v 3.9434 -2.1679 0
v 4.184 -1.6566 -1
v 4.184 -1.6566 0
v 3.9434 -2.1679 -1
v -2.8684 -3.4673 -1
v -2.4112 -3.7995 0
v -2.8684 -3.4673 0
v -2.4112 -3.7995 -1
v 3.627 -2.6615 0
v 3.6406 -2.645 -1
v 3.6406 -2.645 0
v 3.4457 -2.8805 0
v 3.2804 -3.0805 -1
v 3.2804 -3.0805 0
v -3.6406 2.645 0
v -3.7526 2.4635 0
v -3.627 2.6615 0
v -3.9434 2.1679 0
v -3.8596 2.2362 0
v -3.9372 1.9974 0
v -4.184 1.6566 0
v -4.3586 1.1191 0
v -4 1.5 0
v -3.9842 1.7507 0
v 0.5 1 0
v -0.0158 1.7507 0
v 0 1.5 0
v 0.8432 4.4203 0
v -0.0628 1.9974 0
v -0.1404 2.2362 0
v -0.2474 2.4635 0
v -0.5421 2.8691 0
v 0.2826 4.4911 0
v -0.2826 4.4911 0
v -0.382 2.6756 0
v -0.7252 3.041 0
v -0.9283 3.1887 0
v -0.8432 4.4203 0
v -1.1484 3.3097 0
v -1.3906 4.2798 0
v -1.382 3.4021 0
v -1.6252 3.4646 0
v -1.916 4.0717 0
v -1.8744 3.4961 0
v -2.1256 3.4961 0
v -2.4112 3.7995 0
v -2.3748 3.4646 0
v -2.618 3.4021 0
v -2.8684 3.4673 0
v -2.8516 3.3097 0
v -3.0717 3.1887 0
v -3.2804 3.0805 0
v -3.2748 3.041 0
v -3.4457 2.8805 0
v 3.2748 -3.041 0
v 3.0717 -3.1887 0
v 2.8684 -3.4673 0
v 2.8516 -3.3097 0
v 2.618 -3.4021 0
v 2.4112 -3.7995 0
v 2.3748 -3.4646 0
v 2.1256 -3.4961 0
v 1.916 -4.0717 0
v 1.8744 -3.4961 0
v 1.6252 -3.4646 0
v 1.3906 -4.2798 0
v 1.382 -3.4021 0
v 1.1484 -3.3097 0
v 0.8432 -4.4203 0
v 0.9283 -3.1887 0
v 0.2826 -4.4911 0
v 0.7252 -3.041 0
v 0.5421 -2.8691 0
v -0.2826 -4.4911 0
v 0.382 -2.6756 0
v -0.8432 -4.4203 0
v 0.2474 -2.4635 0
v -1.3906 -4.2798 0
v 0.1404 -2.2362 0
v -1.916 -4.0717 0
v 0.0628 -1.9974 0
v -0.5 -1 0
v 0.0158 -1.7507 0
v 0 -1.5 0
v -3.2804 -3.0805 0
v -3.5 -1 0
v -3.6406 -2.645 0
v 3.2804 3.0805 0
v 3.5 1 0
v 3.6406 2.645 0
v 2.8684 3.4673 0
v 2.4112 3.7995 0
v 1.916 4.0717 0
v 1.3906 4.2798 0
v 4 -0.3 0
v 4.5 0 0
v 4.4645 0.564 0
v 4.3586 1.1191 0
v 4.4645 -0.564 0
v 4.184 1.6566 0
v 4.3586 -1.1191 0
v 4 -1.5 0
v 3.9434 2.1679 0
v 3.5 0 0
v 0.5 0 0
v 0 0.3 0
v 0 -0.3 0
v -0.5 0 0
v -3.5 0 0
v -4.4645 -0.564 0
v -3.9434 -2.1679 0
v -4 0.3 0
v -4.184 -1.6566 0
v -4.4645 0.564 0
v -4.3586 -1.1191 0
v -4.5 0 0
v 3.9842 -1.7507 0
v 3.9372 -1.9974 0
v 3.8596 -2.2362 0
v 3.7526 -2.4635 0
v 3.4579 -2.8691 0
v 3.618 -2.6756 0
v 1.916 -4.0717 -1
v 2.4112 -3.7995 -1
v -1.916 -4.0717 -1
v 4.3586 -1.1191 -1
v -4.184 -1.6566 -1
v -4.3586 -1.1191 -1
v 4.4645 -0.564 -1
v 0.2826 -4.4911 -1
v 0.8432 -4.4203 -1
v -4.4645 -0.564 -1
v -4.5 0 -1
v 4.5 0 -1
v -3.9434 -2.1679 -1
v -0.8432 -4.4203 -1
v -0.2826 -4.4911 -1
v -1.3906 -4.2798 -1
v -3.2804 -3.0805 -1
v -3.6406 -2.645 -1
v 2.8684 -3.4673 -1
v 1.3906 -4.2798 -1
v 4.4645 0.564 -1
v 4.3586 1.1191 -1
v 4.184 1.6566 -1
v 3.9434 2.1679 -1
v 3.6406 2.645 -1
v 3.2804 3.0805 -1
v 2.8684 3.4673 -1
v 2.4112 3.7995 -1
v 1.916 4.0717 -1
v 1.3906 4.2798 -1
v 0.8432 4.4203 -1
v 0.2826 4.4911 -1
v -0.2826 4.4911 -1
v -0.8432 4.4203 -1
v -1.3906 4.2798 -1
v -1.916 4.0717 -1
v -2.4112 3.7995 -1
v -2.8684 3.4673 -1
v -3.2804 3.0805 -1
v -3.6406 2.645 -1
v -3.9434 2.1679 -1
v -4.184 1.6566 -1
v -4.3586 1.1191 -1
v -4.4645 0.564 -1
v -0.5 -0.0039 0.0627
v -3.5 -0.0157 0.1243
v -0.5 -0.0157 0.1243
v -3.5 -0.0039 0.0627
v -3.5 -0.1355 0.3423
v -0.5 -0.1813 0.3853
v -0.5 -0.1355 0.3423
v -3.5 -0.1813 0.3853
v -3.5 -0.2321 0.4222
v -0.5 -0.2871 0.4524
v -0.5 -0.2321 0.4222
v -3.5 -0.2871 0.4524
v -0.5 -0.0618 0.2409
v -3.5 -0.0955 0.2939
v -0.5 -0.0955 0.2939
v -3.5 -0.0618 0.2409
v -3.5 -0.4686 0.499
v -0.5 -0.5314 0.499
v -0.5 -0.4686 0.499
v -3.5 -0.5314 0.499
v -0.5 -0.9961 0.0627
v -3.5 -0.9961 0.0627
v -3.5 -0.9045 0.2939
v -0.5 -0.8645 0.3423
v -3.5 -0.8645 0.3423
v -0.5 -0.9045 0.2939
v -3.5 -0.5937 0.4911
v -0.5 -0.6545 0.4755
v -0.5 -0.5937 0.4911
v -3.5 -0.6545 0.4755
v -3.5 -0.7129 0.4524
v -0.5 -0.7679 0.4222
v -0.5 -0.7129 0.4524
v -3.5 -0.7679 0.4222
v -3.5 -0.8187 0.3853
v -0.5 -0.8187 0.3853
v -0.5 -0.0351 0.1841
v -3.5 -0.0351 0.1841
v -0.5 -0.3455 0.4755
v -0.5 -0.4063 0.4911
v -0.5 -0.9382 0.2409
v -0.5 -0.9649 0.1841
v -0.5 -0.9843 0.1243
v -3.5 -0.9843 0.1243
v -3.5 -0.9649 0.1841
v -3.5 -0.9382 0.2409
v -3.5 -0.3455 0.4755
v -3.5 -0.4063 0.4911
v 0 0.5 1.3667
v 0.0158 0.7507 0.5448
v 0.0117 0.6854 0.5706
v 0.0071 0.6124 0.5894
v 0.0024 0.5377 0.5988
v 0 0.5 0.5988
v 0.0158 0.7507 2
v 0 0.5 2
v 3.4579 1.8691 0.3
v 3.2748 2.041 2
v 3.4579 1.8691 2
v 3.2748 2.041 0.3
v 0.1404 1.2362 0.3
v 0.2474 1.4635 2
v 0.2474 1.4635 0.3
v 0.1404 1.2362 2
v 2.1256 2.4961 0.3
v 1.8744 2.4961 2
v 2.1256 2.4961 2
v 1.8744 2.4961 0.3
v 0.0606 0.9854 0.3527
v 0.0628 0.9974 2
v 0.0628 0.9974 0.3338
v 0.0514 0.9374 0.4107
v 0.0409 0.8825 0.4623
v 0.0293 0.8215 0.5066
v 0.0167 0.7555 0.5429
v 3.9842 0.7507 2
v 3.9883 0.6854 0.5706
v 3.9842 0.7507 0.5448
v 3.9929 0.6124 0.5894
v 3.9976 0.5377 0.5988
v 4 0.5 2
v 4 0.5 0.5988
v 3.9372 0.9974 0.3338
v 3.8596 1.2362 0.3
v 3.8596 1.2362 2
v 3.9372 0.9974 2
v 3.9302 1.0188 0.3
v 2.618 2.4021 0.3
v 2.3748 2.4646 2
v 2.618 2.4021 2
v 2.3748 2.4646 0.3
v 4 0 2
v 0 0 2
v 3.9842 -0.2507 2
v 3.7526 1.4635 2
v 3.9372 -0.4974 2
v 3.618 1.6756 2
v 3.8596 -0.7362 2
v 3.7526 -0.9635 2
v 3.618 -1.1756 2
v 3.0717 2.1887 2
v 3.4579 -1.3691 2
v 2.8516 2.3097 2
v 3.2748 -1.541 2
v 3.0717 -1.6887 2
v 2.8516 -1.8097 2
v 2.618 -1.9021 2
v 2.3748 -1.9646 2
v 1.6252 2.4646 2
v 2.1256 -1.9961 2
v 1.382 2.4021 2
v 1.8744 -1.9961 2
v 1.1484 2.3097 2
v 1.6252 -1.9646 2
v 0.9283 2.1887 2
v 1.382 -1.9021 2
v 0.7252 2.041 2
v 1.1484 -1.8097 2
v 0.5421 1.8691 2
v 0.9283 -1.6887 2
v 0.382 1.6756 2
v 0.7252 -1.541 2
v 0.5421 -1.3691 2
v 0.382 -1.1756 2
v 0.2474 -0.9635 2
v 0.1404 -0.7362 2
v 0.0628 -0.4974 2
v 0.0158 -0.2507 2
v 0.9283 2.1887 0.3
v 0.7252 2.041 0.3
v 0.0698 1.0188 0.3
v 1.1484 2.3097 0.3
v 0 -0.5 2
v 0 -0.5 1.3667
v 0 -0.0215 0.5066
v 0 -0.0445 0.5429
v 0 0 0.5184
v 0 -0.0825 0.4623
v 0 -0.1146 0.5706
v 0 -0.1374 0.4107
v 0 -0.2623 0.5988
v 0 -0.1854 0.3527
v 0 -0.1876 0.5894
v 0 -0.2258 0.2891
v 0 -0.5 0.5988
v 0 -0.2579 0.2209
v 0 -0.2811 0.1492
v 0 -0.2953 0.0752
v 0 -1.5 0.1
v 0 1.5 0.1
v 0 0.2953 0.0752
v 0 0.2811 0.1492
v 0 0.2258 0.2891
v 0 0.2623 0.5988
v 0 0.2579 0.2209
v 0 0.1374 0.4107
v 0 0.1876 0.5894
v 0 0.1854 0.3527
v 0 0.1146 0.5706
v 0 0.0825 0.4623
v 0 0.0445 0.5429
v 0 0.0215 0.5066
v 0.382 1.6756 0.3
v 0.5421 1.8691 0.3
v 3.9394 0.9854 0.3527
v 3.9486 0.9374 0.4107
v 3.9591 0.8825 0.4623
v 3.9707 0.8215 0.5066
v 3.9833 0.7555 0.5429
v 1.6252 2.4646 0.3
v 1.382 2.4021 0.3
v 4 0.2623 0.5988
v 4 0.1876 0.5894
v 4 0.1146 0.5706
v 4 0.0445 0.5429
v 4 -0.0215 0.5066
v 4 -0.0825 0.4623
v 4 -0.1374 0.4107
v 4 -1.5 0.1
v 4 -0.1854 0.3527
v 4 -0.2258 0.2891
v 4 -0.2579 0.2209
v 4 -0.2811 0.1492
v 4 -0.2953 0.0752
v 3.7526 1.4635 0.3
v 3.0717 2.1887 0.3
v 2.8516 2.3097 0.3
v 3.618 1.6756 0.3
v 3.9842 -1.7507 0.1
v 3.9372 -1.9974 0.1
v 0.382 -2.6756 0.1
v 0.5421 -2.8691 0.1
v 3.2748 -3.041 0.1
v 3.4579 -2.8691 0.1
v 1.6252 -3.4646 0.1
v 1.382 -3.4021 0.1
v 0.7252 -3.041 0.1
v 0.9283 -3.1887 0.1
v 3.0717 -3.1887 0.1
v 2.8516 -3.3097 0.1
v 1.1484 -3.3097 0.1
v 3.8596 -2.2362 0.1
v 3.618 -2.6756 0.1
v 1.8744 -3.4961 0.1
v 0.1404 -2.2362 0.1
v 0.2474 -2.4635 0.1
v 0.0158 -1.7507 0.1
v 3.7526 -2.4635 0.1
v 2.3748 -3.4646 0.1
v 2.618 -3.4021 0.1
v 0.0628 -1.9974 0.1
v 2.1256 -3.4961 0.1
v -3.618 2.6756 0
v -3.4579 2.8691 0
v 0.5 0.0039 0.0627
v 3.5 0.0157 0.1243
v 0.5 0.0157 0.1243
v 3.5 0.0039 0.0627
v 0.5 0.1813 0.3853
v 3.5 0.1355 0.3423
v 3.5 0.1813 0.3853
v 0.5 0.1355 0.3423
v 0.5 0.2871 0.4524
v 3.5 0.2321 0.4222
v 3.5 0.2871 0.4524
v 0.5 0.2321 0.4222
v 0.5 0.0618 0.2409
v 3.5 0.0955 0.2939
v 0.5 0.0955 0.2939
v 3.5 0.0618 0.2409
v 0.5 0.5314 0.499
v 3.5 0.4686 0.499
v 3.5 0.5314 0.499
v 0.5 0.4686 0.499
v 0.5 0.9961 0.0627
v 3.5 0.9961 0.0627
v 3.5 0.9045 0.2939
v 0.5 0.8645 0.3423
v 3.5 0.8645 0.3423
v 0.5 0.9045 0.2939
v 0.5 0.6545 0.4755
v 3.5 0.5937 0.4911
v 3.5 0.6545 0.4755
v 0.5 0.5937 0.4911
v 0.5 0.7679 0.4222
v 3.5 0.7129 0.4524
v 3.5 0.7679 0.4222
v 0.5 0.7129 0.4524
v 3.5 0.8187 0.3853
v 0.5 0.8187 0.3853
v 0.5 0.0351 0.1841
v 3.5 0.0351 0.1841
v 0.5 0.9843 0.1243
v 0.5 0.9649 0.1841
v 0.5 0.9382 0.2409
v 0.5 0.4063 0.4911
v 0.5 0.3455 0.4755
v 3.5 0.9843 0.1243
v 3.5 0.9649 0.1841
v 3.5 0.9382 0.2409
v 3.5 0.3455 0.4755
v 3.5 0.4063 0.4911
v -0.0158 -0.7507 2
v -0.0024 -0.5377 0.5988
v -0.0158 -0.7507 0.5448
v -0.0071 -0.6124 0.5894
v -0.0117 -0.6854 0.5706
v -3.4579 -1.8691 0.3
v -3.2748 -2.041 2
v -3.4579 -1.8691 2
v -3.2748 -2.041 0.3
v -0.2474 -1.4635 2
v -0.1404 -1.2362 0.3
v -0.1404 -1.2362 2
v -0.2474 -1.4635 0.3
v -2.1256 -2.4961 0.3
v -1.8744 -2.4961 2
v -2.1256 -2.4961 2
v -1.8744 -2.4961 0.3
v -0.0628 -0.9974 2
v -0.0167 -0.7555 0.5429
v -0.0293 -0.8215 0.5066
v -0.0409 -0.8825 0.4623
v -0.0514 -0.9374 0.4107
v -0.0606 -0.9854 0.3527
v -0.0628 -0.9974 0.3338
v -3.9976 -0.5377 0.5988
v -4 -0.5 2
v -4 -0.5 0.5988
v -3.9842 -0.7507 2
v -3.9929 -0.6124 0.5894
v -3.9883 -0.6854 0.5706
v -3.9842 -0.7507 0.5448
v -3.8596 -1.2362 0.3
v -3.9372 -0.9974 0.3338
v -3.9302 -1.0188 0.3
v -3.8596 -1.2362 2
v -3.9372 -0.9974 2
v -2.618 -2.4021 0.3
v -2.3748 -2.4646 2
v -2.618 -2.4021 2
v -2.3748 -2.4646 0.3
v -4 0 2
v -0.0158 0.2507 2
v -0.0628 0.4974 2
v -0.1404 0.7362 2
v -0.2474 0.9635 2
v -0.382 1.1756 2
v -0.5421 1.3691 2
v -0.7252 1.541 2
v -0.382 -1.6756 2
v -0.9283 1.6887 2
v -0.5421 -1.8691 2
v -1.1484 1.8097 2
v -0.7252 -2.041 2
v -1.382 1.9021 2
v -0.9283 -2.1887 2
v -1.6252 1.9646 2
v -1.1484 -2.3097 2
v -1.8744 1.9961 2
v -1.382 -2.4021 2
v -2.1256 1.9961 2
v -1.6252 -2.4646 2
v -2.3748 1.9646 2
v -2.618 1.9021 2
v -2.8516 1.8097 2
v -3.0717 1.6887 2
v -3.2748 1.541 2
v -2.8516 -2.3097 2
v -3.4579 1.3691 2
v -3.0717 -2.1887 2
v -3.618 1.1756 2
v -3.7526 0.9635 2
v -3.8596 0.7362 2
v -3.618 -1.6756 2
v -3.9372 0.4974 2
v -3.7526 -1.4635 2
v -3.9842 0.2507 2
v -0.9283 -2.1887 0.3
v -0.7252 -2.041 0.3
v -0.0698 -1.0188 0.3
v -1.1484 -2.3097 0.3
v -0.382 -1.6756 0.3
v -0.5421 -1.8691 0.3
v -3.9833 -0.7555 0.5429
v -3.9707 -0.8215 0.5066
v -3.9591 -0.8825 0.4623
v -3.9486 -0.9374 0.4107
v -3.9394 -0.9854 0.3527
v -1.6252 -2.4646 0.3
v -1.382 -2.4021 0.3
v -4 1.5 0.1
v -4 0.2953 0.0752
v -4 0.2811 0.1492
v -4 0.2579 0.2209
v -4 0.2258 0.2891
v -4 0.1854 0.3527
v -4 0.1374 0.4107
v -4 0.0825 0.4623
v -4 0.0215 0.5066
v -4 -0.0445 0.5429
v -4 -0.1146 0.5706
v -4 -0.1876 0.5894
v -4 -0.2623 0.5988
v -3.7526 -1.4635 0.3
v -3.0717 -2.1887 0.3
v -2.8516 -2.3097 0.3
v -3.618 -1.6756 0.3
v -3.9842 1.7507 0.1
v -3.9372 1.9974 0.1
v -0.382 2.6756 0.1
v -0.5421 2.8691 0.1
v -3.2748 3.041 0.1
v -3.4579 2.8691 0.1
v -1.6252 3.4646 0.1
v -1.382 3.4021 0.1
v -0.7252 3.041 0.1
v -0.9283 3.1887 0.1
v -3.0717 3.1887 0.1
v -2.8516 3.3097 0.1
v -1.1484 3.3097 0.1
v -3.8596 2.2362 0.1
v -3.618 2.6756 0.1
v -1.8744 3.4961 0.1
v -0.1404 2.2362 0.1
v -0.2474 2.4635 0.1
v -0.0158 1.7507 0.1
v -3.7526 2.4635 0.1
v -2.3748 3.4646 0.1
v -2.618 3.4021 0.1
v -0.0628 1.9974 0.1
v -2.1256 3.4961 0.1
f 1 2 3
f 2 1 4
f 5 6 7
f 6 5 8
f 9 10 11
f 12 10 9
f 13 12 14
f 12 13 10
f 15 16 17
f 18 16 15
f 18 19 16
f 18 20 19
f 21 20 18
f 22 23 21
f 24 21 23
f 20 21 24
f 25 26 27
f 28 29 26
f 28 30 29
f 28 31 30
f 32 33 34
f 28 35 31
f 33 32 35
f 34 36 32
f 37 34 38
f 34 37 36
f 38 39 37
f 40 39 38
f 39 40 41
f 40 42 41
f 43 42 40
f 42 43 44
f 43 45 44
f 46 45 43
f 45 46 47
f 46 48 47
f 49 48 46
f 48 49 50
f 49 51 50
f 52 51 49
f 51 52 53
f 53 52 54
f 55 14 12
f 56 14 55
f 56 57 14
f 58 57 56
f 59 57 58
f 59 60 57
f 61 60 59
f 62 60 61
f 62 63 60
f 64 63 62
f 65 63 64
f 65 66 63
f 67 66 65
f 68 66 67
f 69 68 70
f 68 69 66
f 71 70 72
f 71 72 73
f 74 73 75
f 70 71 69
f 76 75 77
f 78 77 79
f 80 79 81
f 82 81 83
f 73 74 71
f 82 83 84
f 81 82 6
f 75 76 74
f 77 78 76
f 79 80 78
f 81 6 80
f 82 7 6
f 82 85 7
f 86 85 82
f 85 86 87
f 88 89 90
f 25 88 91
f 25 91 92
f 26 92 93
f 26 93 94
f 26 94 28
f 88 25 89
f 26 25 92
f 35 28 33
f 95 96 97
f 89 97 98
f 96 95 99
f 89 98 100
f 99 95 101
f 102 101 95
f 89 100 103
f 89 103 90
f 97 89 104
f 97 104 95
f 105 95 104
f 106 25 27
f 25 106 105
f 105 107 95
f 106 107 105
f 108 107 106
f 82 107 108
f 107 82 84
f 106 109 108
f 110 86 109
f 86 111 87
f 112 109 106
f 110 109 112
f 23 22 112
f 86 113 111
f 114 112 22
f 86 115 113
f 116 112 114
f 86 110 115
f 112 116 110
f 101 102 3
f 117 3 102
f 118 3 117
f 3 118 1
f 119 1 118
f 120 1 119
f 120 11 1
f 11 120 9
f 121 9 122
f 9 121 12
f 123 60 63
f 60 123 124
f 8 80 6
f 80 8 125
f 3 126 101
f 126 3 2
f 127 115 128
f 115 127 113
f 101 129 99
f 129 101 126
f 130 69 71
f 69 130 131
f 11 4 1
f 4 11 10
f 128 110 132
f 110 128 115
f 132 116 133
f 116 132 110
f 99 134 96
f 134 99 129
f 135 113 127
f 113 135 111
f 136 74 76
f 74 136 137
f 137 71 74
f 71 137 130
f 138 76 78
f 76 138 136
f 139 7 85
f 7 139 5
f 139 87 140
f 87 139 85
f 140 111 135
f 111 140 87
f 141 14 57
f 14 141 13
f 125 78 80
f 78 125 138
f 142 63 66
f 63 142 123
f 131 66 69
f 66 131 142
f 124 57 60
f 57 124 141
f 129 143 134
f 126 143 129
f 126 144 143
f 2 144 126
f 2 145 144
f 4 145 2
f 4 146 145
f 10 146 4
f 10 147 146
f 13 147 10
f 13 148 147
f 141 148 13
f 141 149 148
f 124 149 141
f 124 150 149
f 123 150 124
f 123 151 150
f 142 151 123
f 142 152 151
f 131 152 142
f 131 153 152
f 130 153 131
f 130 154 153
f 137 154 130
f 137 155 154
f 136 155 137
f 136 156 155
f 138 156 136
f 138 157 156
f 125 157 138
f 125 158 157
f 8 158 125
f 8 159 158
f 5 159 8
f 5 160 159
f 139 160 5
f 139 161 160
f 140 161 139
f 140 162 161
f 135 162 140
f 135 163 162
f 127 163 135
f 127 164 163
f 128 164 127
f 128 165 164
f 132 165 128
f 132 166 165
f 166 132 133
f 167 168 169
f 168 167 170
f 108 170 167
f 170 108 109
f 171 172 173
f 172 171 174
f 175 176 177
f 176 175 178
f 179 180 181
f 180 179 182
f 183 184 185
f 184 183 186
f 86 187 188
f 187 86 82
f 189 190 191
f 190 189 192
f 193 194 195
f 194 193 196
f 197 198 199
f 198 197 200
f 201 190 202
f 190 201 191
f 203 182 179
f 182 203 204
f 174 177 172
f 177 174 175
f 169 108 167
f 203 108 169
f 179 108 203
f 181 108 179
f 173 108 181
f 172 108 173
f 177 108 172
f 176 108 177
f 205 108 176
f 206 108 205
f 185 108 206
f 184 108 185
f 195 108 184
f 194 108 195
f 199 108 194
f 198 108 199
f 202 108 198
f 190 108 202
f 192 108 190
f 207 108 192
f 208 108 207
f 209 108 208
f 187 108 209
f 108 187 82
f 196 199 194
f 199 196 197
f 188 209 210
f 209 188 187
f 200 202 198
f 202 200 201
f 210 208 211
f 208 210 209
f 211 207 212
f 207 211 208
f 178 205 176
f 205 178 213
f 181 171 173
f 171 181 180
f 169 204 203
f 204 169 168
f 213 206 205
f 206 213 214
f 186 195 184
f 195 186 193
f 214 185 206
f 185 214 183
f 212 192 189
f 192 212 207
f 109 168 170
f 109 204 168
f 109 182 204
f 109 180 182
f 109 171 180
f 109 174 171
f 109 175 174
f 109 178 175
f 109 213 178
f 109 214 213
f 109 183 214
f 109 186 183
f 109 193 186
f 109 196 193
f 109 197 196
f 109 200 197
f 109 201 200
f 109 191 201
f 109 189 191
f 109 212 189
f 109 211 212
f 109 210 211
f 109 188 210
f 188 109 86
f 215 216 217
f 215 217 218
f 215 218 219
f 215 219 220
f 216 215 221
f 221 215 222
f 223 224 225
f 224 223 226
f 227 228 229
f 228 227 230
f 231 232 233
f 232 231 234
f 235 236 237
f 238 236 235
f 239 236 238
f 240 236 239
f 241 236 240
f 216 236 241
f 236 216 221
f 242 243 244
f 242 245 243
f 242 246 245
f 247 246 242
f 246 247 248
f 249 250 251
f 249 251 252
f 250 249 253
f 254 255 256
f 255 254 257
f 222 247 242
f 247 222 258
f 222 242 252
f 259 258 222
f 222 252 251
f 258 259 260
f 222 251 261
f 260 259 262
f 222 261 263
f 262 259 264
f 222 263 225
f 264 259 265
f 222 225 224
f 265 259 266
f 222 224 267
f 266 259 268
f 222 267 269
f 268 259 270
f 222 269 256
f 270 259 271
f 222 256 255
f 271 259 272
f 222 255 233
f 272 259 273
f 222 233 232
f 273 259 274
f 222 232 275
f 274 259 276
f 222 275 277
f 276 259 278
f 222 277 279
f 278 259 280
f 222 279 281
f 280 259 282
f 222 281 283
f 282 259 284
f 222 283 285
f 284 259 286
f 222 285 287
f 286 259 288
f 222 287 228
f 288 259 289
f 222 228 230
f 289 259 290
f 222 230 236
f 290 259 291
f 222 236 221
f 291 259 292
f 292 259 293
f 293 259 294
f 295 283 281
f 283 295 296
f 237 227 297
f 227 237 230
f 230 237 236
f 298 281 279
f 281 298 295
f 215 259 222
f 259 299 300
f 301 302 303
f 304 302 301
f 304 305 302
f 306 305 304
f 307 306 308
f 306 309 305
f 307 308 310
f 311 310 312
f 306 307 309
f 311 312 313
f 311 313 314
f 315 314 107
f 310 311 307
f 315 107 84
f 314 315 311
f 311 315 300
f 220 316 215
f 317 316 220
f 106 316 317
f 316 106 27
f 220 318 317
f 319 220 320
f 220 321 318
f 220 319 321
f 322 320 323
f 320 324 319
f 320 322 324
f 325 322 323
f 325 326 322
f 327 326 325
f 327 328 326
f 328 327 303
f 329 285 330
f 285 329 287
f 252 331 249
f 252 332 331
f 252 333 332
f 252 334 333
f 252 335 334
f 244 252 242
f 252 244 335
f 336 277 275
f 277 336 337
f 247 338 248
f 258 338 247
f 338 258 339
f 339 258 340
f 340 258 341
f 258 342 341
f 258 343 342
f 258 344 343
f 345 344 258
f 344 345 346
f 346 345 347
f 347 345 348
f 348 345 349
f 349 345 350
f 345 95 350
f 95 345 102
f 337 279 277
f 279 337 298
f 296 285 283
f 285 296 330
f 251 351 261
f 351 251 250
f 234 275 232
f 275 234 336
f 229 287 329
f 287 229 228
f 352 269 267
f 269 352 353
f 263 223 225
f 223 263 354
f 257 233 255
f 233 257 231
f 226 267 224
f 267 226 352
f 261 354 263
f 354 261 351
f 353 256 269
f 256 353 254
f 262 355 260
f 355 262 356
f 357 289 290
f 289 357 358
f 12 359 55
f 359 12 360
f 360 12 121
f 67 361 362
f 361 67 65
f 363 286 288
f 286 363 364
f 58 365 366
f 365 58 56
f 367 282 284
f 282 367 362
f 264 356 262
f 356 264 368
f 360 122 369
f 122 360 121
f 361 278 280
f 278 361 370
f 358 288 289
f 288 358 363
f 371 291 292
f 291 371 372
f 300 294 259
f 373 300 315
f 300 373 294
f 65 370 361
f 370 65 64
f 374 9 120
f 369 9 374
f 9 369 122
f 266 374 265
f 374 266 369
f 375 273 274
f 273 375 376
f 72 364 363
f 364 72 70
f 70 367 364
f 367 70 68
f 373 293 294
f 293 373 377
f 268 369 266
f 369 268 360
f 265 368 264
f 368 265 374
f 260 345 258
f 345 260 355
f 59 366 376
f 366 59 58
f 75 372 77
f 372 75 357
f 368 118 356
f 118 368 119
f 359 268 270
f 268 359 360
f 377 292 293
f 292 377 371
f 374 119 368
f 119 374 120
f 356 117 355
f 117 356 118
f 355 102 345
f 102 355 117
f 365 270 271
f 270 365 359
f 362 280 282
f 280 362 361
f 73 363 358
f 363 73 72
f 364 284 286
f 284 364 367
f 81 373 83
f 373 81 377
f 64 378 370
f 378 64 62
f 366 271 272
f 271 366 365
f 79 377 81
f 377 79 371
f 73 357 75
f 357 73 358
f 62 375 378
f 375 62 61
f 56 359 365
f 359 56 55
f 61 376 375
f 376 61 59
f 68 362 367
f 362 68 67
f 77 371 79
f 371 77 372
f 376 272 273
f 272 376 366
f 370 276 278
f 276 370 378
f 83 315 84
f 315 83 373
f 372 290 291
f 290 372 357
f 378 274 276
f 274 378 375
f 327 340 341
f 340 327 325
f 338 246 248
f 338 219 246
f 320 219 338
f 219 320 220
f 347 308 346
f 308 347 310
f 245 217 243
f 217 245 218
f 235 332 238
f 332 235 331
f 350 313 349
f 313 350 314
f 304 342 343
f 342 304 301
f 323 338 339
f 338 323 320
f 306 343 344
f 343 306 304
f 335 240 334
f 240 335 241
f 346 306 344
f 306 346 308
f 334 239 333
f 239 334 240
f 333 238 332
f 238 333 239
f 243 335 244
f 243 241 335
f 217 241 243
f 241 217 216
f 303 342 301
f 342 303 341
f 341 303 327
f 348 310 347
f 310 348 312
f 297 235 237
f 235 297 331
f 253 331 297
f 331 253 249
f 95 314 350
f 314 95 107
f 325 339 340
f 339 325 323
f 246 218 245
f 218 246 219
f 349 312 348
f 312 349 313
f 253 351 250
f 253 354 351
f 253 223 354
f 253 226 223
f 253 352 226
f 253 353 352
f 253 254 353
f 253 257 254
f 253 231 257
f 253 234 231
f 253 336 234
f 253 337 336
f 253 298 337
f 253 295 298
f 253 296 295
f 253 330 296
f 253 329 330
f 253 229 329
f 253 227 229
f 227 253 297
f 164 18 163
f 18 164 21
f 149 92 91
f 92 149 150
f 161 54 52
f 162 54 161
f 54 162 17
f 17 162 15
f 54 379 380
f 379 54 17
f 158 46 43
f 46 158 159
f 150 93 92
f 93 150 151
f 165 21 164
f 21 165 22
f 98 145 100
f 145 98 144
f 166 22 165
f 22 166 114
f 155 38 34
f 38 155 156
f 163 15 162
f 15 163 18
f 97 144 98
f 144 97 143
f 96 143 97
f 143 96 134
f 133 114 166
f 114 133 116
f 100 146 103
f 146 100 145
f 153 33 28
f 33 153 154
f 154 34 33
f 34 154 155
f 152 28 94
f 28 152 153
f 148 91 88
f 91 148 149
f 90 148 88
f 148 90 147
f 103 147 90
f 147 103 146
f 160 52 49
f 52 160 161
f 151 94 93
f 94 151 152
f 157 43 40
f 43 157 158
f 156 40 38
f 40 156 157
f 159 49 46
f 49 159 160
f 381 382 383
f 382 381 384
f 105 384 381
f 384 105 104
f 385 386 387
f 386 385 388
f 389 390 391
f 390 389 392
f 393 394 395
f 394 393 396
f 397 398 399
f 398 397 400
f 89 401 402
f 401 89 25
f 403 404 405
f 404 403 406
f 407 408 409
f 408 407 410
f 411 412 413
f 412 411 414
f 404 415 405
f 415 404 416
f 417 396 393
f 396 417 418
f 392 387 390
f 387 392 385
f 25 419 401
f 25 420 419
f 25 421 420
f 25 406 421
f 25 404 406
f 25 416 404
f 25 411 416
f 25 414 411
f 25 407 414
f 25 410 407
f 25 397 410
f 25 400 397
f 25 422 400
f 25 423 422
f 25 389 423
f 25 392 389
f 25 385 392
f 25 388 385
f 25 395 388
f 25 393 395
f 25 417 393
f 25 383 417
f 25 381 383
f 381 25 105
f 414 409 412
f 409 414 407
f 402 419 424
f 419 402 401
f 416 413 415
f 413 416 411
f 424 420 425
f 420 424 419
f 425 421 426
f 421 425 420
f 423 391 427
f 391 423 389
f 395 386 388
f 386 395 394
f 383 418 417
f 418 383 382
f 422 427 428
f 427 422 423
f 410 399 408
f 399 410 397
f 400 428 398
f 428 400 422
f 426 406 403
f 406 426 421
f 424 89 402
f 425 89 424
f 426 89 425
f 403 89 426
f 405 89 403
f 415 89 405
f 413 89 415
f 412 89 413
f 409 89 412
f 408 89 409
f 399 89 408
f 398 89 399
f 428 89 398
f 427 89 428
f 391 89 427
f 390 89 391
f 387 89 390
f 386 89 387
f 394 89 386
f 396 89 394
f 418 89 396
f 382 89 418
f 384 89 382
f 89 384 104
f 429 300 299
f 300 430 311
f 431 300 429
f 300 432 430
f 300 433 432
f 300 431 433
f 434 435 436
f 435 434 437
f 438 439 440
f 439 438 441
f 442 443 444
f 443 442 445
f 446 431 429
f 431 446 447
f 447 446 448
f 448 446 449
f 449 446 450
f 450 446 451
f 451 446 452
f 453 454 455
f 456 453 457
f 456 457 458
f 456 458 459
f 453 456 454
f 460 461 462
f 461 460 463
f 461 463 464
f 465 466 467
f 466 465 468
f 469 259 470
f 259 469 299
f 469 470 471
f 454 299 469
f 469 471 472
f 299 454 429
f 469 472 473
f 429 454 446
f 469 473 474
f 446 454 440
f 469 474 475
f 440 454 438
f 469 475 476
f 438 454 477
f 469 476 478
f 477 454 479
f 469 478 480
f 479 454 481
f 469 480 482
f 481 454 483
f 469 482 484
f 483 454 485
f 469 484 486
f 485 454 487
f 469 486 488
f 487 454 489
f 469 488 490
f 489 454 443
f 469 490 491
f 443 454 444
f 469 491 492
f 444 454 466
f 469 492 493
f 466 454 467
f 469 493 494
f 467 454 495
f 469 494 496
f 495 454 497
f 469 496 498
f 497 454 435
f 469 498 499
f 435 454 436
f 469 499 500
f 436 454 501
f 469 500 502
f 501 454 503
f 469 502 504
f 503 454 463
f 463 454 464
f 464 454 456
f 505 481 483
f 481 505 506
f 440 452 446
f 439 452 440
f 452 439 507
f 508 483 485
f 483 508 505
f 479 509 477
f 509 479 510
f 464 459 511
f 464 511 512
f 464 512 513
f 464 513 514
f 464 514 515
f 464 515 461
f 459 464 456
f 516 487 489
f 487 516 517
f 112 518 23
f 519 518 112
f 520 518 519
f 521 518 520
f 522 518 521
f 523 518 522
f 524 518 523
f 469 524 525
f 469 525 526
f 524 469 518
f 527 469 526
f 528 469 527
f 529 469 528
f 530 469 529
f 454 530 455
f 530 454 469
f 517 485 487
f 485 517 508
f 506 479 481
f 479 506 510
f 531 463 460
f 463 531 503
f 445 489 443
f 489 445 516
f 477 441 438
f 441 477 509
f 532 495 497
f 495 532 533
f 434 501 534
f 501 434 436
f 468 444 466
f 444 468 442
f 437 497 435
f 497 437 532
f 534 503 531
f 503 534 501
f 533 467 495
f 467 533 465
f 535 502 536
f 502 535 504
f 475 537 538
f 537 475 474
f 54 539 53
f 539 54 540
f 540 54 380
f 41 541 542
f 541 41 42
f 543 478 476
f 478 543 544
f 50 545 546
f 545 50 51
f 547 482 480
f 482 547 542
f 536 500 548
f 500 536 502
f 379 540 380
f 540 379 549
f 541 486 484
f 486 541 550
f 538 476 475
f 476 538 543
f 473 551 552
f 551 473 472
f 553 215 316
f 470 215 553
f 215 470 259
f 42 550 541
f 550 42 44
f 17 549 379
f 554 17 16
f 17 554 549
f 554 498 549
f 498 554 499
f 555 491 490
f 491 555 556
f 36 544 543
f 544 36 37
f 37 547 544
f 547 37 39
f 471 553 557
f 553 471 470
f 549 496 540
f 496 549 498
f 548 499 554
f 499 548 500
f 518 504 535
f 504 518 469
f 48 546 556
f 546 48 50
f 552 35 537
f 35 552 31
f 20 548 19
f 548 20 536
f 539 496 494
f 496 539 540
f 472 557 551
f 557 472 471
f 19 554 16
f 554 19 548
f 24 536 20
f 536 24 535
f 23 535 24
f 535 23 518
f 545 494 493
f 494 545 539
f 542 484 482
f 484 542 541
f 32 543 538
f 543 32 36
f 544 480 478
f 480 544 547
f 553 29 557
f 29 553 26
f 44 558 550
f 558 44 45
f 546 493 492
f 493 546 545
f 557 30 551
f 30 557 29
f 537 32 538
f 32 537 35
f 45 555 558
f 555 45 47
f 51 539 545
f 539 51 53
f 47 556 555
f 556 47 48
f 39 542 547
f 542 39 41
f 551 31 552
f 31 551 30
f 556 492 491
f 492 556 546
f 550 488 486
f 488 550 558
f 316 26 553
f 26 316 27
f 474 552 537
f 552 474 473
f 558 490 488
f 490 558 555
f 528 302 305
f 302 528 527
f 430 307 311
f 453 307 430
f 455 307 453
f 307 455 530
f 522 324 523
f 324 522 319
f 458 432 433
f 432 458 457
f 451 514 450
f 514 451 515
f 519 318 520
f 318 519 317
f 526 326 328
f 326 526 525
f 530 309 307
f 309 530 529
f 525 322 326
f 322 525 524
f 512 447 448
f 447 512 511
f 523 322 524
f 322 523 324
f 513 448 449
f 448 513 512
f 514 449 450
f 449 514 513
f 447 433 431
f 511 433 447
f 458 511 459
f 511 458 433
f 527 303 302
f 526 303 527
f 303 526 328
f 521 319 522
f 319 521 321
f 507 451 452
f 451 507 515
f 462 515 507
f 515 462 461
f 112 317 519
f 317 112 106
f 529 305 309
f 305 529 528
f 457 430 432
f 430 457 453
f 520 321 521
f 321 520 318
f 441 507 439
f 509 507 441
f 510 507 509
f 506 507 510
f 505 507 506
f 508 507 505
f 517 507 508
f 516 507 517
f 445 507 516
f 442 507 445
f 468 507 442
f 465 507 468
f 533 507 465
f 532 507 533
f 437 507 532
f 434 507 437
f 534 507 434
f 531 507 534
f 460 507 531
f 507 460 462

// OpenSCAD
/*
  author: Christopher O'Brien <obriencj@gmail.com>
  license: GPL v3
*/


module clasp_half($fn=50) {

     union() {
	  // backing plate half-circle and lip
	  translate([0, 0, -1]) {
	       intersection() {
		    translate([0, -4, 1]) {
			 cube([10, 8, 2], center=true);
		    };
		    union() {
			 cylinder(1, 4.5, 4.5);
			 translate([-3.5, -0.5, 1]) {
			      rotate([90, 0, 90]) {
				   cylinder(3, 0.5, 0.5);
			      };
			 };
		    };
	       };
	  };

	  translate([1, 1, 0]) {
	       difference() {
		    union() {
			 // the catch itself
			 hull() {
			      translate([1, -0.5, 0]) {
				   cylinder(2, 2, 2);
			      };
			      translate([1, -1, 0]) {
				   cylinder(2, 2, 2);
			      };
			 };
			 // connecting slant for catch
			 hull() {
			      translate([1, -1, 0]) {
				   cylinder(2, 2, 2);
			      };
			      translate([1, -2.5, 0]) {
				   cylinder(0.1, 2, 2);
			      };
			 };
		    };

		    // the negative space for the lip to get caught in
		    hull() {
			 translate([-4.5, -0.5, 0]) {
			      rotate([90, 0, 90]) {
				   cylinder(9, 0.6, 0.6);
			      };
			 };
			 translate([-4.5, -0.7, 0]) {
			      rotate([90, 0, 90]) {
				   cylinder(9, 0.6, 0.6);
			      };
			 };
		    };

		    // a bit of space to make it easier
		    translate([-1.5, -1, -0.7]) {
			 cube([5, 4, 1]);
		    };
	       };
	  };
     };

}


// For debugging, render a pair of clasp halves, with the second
// highlighted


module dupl_flip() {
     children();
     #rotate([0, 0, 180]) children();
}


dupl_flip() {
     clasp_half();
};


// The end.
